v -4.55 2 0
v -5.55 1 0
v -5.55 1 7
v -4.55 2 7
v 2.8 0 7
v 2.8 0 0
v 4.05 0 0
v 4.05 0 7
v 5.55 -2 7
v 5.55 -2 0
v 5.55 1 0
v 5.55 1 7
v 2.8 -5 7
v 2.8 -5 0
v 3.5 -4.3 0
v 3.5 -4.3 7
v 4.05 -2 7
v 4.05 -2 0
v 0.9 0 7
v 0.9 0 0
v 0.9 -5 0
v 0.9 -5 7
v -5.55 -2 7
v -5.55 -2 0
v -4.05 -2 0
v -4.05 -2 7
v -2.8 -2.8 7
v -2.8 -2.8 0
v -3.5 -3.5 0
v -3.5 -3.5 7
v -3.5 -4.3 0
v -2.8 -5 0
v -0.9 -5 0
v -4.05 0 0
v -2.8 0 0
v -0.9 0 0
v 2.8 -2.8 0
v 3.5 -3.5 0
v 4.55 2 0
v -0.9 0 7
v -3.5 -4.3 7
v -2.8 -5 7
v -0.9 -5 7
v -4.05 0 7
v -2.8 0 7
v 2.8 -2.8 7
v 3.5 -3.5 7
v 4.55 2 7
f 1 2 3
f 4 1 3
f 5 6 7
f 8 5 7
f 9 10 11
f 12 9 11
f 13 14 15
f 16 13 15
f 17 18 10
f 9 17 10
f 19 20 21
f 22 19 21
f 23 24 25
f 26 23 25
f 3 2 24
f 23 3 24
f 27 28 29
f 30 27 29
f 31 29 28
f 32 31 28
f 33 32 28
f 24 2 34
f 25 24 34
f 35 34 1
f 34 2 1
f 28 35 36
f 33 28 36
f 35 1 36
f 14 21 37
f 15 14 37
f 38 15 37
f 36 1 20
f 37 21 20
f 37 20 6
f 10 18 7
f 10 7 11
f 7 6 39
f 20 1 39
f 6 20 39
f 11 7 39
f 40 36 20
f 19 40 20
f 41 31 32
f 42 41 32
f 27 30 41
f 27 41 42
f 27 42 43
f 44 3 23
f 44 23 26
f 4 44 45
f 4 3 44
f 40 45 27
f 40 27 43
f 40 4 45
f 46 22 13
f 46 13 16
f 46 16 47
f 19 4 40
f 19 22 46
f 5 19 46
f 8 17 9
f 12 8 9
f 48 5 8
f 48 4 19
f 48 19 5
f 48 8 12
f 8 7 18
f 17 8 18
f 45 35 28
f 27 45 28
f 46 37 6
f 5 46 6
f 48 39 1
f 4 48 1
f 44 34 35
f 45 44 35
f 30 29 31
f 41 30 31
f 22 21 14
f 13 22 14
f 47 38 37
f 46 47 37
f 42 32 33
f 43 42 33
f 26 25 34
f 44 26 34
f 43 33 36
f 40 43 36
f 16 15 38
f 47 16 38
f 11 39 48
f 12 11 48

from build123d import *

# Parameters (mm, degrees)
F1_DEPTH = 7
F2_SIZE  = 1


with BuildPart() as f1:
    # F0 (on Top) → F1 (new body)
    with BuildSketch(Plane.XY):
        Polygon((-0.9, -5), (-0.9, 0), (-2.8, 0), (-2.8, -2.8), (-2.8, -5), align=None)
        Polygon((-2.8, 0), (-0.9, 0), (0.9, 0), (2.8, 0), (4.05, 0), (4.05, -2), (5.55, -2), (5.55, 2), (0, 2), (-5.55, 2), (-5.55, -2), (-4.05, -2), (-4.05, 0), align=None)
        Polygon((2.8, 0), (0.9, 0), (0.9, -5), (2.8, -5), (2.8, -2.8), align=None)
        Polygon((-2.8, -5), (-2.8, -2.8), (-3.5, -3.5), (-3.5, -4.3), align=None)
        Polygon((2.8, -2.8), (2.8, -5), (3.5, -4.3), (3.5, -3.5), align=None)
    extrude(amount=F1_DEPTH)

    # F2
    f2_edges = [f1.edges().sort_by_distance(p)[0] for p in [
        (-5.55, 2, 3.5),
        (5.55, 2, 3.5),
    ]]
    chamfer(f2_edges, length=F2_SIZE)


solid = f1.part
